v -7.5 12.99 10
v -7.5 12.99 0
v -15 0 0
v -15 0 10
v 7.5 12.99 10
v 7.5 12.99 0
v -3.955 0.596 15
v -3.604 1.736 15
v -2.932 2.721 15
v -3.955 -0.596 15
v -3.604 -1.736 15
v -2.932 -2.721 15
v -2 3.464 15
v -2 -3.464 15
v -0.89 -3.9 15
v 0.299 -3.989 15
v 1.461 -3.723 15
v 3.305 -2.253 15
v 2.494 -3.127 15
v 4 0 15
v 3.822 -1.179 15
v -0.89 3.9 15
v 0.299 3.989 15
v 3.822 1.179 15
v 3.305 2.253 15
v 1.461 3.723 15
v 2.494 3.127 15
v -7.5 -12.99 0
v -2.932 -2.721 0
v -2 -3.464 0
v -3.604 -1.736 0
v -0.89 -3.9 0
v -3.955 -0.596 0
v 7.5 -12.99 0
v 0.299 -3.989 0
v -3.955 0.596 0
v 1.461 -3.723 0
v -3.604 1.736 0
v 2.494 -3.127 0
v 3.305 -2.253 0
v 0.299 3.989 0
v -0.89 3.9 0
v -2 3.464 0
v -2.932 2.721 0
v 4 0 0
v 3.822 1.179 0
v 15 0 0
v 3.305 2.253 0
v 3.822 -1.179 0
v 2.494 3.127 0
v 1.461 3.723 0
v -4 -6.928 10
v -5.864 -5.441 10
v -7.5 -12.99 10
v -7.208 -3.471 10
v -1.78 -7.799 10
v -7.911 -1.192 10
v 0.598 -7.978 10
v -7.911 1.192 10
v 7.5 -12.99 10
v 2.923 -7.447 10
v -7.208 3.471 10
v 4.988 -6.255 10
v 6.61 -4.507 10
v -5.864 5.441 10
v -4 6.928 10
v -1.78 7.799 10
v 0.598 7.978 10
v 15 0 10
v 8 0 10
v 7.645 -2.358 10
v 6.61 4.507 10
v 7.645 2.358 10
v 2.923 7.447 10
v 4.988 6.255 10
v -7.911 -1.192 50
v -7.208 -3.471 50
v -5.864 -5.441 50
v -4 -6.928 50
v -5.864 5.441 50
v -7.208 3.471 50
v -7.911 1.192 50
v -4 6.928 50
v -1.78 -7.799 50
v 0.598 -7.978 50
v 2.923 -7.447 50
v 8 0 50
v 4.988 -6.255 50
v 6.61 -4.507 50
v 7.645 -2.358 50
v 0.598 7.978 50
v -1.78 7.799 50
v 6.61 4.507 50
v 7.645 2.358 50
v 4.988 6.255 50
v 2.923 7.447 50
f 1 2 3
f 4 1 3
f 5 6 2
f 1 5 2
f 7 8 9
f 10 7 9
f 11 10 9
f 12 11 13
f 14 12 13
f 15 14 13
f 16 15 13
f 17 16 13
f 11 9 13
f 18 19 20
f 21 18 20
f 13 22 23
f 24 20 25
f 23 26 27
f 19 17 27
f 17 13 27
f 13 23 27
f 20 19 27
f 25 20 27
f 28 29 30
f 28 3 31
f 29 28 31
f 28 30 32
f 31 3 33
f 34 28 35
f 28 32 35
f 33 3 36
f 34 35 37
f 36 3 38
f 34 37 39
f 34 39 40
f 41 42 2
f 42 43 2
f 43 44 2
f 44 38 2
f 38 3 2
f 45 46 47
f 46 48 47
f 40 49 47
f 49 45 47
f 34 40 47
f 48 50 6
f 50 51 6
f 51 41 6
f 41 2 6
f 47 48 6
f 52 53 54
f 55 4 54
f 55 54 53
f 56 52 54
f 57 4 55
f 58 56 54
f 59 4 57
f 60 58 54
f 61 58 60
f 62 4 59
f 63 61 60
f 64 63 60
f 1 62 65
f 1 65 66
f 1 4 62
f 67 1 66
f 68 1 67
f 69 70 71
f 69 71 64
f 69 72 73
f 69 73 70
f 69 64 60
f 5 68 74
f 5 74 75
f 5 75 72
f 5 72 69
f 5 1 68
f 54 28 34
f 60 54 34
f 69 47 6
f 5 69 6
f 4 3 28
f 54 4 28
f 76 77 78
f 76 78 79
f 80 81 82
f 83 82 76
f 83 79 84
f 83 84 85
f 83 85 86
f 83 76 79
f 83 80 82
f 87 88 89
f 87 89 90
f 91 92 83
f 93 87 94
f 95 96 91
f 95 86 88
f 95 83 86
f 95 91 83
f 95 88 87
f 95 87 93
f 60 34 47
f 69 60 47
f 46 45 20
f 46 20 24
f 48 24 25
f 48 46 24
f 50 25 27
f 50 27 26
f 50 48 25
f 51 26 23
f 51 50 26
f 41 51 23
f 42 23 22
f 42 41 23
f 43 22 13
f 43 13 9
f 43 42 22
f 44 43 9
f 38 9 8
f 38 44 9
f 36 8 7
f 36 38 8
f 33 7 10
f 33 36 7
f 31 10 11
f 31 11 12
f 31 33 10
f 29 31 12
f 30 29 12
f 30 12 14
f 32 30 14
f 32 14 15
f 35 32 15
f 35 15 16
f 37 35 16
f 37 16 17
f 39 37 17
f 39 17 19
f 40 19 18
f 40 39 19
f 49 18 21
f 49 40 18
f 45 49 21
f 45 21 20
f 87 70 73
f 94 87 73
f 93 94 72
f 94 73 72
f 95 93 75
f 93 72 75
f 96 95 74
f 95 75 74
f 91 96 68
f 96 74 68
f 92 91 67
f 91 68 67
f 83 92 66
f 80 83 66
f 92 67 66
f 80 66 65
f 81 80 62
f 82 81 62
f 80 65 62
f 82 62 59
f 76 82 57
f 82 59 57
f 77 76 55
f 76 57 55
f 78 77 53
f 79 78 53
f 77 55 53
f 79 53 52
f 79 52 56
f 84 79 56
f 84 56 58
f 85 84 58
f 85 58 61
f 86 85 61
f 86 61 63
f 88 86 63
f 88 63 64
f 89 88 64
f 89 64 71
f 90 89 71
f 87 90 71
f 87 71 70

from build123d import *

# Parameters (mm, degrees)
EXTRUDE_1_DEPTH     = 10
SKETCH_2_R          = 8
EXTRUDE_2_DEPTH     = 50
SKETCH_3_R          = 4
CUT_EXTRUDE_2_DEPTH = 15


with BuildPart() as part:
    # 草图1 → 凸台-拉伸1 (new body)
    with BuildSketch(Plane.XY):
        Polygon((15, 0), (7.5, 12.990381057), (-7.5, 12.990381057), (-15, 0), (-7.5, -12.990381057), (7.5, -12.990381057), align=None)
    extrude(amount=EXTRUDE_1_DEPTH)

    # 草图2 → 凸台-拉伸2 (add)
    with BuildSketch(Plane.XY):
        Circle(SKETCH_2_R)
    extrude(amount=EXTRUDE_2_DEPTH)

    # 草图3 → 切除-拉伸2 (cut)
    with BuildSketch(Plane.XY):
        Circle(SKETCH_3_R)
    extrude(amount=CUT_EXTRUDE_2_DEPTH, mode=Mode.SUBTRACT)


solid = part.part
